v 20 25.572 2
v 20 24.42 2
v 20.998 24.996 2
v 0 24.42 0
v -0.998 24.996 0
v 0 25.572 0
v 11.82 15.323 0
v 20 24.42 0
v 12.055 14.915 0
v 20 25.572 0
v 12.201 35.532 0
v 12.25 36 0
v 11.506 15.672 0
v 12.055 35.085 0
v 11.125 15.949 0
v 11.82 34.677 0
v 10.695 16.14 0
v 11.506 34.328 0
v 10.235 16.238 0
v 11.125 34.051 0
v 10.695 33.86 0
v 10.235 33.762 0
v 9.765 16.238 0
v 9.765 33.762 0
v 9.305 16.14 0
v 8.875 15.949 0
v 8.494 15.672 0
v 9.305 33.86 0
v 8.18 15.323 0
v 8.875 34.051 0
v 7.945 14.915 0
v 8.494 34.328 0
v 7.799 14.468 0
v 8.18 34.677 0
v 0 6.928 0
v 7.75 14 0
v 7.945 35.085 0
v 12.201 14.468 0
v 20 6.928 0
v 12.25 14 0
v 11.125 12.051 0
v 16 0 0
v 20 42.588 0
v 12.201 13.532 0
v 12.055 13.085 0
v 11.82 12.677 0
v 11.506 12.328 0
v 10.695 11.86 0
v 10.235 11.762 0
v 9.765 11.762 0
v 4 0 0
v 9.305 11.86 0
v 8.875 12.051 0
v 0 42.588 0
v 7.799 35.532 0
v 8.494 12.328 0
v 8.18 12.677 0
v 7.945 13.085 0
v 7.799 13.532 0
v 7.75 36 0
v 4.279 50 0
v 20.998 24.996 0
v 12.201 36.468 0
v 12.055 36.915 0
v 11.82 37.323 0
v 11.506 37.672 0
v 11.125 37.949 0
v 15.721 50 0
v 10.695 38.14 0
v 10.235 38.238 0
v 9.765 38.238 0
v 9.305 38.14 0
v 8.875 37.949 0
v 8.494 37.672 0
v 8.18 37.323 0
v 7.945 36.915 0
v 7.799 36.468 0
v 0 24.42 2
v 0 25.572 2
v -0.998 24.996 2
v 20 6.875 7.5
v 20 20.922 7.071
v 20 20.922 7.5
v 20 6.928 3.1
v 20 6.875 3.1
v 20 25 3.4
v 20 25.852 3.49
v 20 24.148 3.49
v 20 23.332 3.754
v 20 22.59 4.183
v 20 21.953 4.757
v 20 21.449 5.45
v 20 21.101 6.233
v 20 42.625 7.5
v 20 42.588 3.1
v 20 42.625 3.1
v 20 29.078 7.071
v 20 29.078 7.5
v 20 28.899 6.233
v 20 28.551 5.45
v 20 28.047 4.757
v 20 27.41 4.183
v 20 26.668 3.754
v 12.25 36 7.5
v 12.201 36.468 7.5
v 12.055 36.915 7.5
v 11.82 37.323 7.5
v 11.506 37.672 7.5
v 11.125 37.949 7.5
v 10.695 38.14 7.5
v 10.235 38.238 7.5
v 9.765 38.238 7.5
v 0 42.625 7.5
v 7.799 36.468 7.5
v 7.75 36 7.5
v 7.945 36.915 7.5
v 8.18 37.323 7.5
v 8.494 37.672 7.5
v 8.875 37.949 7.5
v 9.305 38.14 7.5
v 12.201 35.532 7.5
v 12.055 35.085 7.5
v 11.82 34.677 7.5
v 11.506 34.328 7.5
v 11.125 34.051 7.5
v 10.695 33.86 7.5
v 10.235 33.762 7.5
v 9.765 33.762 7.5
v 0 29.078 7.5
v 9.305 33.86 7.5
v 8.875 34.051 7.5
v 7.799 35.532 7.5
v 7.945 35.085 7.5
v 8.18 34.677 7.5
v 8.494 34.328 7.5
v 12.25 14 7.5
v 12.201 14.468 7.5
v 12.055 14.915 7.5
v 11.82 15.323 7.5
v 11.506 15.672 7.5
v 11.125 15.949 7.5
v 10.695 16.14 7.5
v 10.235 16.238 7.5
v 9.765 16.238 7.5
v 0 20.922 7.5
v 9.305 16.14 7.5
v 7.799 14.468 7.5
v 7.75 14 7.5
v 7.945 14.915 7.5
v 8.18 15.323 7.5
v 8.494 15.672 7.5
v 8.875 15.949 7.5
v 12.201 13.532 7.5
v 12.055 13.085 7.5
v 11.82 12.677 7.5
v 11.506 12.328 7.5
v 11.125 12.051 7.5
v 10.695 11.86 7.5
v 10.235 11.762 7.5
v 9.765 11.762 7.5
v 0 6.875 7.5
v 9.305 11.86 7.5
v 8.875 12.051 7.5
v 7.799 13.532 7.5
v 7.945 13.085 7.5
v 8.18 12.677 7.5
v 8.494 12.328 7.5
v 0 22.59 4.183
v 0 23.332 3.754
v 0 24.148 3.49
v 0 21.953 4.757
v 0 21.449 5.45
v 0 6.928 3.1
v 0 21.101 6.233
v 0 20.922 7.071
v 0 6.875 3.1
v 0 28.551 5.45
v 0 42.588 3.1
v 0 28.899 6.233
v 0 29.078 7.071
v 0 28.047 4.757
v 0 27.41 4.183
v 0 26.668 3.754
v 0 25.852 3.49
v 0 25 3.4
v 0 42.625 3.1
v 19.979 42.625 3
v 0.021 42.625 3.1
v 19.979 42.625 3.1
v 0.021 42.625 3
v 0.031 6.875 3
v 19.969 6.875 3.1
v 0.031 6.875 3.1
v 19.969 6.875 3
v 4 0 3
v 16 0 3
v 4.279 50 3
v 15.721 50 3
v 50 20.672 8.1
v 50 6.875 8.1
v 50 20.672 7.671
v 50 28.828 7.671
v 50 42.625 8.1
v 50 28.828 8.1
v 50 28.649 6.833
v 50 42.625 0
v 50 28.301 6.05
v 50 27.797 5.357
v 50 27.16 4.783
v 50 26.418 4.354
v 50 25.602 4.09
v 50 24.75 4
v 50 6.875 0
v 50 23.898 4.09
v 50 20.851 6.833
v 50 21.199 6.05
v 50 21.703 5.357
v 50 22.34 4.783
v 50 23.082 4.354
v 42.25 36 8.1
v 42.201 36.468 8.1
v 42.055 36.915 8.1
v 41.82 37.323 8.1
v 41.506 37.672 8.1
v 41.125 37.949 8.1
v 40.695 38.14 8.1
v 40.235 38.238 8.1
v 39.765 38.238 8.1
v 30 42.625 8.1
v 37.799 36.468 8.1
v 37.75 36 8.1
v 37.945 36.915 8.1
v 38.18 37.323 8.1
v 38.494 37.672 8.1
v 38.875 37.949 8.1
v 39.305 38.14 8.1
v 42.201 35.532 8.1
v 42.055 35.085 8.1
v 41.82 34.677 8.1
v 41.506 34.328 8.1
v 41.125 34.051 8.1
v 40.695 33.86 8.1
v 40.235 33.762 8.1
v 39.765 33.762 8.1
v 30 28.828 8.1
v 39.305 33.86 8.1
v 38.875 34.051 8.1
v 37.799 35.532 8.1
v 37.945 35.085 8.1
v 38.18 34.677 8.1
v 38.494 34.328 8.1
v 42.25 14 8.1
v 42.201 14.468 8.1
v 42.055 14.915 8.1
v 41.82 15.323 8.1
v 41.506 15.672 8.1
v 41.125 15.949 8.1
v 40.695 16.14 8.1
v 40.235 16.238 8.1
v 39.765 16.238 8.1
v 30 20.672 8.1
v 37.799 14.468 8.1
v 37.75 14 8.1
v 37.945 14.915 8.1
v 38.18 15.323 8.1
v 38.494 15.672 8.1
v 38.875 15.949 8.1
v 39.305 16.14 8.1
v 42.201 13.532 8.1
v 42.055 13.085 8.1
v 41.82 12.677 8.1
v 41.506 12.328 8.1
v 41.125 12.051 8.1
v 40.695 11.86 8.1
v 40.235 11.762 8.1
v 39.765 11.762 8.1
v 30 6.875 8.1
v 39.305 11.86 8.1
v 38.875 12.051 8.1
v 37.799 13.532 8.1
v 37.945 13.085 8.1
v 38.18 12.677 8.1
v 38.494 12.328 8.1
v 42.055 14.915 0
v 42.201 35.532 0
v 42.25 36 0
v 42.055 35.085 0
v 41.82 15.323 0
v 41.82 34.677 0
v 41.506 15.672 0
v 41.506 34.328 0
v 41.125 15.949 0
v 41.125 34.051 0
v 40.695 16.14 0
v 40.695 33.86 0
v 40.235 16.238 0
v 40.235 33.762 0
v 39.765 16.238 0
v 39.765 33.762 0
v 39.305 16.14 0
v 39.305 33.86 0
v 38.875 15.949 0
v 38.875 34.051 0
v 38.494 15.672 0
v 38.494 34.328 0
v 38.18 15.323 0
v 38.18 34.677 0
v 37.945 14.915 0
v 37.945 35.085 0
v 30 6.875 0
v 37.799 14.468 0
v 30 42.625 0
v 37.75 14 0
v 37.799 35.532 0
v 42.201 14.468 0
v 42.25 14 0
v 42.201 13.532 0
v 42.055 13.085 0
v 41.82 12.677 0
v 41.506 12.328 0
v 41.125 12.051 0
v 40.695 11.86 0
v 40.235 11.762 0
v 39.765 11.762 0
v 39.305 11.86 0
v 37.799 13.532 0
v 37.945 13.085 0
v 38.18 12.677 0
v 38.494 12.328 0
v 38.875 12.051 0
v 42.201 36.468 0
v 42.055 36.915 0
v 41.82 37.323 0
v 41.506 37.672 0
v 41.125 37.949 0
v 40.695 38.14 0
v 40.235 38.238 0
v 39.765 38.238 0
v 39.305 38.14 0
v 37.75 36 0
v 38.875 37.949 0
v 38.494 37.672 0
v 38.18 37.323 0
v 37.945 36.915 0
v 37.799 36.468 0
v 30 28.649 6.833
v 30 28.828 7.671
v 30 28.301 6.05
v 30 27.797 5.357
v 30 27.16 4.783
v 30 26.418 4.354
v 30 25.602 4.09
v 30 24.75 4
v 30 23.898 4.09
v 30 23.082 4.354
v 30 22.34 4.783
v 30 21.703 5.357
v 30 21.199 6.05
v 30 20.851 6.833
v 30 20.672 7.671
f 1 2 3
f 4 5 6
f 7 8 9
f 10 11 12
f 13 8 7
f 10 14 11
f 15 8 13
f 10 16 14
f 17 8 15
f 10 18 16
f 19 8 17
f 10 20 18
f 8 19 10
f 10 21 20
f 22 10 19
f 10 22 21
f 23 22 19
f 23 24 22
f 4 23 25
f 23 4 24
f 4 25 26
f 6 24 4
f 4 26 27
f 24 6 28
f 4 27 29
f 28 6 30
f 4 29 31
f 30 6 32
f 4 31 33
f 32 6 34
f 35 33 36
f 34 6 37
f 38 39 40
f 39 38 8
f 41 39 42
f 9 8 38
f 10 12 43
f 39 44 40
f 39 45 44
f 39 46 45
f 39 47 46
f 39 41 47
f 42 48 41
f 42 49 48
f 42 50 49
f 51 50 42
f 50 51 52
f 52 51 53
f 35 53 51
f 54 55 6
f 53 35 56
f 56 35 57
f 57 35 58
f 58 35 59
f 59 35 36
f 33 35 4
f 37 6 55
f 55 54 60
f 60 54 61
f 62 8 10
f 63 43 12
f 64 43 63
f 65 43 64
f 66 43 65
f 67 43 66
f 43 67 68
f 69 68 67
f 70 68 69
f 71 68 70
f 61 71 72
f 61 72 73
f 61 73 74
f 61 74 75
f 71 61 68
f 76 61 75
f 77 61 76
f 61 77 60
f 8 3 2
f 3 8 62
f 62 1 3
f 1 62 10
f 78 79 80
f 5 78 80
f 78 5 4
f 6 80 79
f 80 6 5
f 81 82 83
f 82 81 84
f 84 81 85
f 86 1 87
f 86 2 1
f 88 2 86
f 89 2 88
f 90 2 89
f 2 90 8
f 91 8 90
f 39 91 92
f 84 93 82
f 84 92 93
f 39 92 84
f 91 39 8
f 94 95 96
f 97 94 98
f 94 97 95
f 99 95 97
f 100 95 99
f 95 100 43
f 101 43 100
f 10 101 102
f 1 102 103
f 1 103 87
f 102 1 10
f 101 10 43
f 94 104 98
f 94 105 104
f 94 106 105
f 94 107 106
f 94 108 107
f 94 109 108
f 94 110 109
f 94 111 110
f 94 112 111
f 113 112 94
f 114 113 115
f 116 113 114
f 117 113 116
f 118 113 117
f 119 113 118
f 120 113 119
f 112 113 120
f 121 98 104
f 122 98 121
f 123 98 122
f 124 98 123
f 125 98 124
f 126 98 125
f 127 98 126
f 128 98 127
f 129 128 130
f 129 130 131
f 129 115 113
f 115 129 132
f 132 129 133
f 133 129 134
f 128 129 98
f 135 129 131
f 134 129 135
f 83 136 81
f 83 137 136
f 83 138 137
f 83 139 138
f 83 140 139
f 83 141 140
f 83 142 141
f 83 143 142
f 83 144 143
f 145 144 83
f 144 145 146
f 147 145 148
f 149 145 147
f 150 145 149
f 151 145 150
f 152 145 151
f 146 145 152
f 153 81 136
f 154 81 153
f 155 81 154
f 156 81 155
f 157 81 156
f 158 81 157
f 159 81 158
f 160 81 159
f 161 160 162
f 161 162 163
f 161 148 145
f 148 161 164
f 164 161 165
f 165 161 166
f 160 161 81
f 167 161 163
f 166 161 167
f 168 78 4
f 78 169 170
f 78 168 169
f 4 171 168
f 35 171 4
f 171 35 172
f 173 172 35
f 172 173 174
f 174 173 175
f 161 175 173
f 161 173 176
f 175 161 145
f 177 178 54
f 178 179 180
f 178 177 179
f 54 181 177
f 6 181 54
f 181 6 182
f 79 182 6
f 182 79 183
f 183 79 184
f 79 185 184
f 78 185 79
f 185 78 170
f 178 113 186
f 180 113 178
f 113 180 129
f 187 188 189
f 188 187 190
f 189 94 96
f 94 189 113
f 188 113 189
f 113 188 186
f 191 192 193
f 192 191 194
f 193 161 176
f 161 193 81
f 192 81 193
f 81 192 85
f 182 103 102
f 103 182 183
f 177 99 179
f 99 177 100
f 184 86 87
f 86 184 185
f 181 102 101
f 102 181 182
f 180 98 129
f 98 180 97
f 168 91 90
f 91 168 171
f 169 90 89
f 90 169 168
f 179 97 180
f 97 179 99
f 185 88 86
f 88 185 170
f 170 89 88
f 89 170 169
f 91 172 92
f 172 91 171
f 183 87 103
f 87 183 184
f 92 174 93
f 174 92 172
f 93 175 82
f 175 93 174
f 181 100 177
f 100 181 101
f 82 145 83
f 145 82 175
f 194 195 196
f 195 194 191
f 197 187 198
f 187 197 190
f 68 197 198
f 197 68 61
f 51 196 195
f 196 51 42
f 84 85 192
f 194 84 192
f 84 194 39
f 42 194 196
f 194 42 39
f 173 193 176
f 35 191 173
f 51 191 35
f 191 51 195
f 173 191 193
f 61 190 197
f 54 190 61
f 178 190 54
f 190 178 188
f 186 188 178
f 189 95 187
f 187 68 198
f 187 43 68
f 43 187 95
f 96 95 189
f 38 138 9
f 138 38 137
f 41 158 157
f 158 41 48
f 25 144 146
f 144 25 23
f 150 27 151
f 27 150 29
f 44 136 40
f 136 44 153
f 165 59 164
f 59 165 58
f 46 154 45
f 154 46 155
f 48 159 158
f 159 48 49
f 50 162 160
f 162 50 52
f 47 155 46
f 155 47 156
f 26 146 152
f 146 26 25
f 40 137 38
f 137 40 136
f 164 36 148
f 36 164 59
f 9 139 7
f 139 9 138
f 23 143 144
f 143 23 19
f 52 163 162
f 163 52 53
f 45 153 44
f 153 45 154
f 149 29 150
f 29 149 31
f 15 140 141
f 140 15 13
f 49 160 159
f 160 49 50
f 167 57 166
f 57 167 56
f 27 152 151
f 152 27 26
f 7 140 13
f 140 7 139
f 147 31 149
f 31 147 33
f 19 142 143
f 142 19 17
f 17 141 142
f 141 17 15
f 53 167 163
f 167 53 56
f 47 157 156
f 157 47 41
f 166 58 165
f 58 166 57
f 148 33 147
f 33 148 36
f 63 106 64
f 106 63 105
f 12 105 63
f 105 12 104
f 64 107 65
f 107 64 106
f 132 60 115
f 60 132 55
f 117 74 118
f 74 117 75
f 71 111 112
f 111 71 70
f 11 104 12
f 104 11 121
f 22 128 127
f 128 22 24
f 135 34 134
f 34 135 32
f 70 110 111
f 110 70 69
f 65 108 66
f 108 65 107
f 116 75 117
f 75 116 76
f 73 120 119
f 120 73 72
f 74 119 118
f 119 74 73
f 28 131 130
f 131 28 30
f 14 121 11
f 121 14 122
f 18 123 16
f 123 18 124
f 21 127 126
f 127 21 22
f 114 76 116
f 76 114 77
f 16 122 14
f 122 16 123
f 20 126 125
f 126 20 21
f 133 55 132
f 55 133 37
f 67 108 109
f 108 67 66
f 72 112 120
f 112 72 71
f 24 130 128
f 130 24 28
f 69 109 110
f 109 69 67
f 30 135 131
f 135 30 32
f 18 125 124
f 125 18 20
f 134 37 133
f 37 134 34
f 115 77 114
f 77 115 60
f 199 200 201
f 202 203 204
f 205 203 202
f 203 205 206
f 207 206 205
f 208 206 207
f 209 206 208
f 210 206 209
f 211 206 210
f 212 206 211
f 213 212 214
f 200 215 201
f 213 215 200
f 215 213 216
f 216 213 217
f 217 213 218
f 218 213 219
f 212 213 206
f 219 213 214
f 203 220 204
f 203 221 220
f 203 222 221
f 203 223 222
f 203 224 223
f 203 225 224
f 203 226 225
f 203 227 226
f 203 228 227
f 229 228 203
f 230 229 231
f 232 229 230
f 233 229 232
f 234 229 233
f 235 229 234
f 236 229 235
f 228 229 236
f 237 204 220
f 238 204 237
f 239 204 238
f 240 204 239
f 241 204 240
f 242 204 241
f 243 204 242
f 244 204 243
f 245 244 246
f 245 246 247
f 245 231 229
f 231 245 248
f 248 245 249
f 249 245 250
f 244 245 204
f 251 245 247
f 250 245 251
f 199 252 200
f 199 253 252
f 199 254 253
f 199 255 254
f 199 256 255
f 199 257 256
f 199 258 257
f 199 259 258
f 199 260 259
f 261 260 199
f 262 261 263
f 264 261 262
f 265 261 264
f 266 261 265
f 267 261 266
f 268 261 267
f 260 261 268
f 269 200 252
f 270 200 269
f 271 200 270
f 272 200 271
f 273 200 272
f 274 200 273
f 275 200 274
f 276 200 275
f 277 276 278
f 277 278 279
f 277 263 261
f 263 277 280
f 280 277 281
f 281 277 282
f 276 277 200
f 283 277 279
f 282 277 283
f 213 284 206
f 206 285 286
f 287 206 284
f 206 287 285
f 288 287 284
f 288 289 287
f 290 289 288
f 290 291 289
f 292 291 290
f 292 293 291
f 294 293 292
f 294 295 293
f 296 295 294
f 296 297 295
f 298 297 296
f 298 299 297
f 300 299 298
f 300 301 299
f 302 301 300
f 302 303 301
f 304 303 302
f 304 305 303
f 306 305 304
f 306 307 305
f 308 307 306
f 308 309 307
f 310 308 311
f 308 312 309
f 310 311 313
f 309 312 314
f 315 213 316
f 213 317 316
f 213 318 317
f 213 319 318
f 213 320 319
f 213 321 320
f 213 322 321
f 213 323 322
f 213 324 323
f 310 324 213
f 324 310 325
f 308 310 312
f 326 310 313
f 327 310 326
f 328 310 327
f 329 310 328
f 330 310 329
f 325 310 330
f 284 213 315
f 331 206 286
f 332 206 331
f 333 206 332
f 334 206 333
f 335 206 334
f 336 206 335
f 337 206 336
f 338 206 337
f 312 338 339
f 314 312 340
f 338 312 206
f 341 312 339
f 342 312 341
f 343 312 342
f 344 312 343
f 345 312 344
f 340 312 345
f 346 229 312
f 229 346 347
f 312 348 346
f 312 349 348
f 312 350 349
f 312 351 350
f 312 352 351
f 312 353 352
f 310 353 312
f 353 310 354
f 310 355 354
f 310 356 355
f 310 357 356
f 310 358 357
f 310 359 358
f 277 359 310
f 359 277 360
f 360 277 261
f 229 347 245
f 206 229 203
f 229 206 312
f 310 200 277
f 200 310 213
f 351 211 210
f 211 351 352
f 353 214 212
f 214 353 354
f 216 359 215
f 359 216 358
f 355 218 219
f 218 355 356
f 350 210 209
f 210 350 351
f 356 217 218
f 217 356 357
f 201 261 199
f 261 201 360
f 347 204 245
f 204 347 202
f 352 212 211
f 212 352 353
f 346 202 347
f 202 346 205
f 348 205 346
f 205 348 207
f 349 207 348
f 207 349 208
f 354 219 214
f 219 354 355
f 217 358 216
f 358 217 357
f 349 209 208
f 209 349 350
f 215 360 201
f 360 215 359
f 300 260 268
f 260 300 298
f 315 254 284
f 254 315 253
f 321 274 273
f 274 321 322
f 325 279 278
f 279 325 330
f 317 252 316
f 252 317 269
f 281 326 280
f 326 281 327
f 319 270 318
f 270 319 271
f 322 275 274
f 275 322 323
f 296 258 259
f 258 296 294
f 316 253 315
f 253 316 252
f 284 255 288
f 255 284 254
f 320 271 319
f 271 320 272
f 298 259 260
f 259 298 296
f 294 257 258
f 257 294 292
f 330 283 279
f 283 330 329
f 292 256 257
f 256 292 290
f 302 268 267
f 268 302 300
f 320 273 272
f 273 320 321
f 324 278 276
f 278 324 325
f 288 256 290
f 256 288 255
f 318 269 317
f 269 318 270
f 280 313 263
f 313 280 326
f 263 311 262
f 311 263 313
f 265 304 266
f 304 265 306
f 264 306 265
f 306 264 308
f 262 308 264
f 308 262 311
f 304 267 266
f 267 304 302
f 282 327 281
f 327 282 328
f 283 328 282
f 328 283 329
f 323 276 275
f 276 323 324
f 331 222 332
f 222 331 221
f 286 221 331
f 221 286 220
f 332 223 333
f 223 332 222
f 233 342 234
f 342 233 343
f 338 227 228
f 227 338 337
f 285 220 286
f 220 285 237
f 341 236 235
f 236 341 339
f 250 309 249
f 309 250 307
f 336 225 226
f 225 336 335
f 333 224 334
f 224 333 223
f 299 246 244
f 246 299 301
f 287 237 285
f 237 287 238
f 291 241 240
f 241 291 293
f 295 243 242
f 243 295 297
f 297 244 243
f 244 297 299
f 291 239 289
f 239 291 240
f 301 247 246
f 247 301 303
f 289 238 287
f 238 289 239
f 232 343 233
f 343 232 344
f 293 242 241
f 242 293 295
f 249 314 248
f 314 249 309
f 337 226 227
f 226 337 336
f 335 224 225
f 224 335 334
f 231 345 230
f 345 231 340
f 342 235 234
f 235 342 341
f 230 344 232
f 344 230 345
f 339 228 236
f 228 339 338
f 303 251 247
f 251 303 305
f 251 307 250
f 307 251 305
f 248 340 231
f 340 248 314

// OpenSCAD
// file: functions.scad
// PRUSA Mendel  
// Functions used in many files
// GNU GPL v2
// Josef Průša
// josefprusa@me.com
// prusadjs.cz
// http://www.reprap.org/wiki/Prusa_Mendel
// http://github.com/prusajr/PrusaMendel

module nut(d,h,horizontal=true){
cornerdiameter =  (d / 2) / cos (180 / 6);
cylinder(h = h, r = cornerdiameter, $fn = 6);
if(horizontal){
for(i = [1:6]){
	rotate([0,0,60*i]) translate([-cornerdiameter-0.2,0,0]) rotate([0,0,-45]) cube(size = [2,2,h]);
}}
}

// By nophead
module polyhole(d,h) {
    n = max(round(2 * d),3);
    rotate([0,0,180])
        cylinder(h = h, r = (d / 2) / cos (180 / n), $fn = n);
}




module roundcorner(diameter){
	difference(){
		cube(size = [diameter,diameter,99], center = false);
		translate(v = [diameter, diameter, 0]) cylinder(h = 100, r=diameter, center=true);
	}
}
// file: metric.scad
// PRUSA Mendel  
// Default metric sizes
// GNU GPL v2
// Josef Průša
// josefprusa@me.com
// prusadjs.cz
// http://www.reprap.org/wiki/Prusa_Mendel
// http://github.com/prusajr/PrusaMendel

// DONT CHANGE THIS FILE! ALTER VALUES IN CONFIGURATION.SCAD INSTEAD

// RODS

threaded_rod_diameter = 8.2;
threaded_rod_diameter_horizontal = 8.2;
smooth_bar_diameter = 8;
smooth_bar_diameter_horizontal = 8.5;

// Nuts and bolts

m8_diameter = 9;
m8_nut_diameter = 16.4;

m4_diameter = 4.5;
m4_nut_diameter = 9;

m3_diameter = 3.6;
m3_nut_diameter = 6.1;

// Bushing holder

bushing_core_diameter = smooth_bar_diameter;
bushing_material_thickness = 1;

// Motors

motor_shaft = 5.5;
// file: configuration.scad
// PRUSA Mendel  
// Configuration file
// GNU GPL v2
// Josef Průša
// josefprusa@me.com
// prusadjs.cz
// http://www.reprap.org/wiki/Prusa_Mendel
// http://github.com/prusajr/PrusaMendel

// PLEASE SELECT ONE OF THE CONFIGURATIONS BELOW
// BY UN-COMMENTING IT

// Uncomment for metric settings
// METRIC METRIC METRIC METRIC METRIC METRIC METRIC METRIC 

include <metric.scad>;

// Uncomment for imperial settings
// IMPERIAL IMPERIAL IMPERIAL IMPERIAL IMPERIAL IMPERIAL IMPERIAL 

//include <sae.scad>;

// CUSTOM CUSTOM CUSTOM CUSTOM CUSTOM CUSTOM CUSTOM CUSTOM CUSTOM

thin_wall = 3;

// LM8UU
linear = false;


// CHANGE ONLY THE STUFF YOU KNOW
// IT WILL REPLACE DEFAULT SETTING

// RODS

// threaded_rod_diameter = 0;
// threaded_rod_diameter_horizontal = 0;
// smooth_bar_díameter = 0;
// smooth_bar_díameter_horizontal = 0;

// Nuts and bolts

// m8_diameter = 0;
// m8_nut_diameter = 0;

// m4_diameter = 0;
// m4_nut_diameter = 0;

// m3_diameter = 0;
// m3_nut_diameter = 0;

// Bushing holder

// bushing_core_diameter = smooth_bar_díameter;
// bushing_material_thickness = 0;


///counted stuff
m3_nut_diameter_bigger = ((m3_nut_diameter  / 2) / cos (180 / 6))*2;

// functions 
include <functions.scad>
// main file
// C. Strang		
// cstrang@????
// funfor.us

include <configuration.scad>;

h = 3;       	// base thickness
m = h-1;			// marker height
o = 0.1;			//  overlap amount
hh = 14;			// bar holder height
an=m4_diameter ; 


m3=m3_diameter;
m3n=m3_nut_diameter;
bar=smooth_bar_diameter_horizontal;

$fn=30;

yzrodholder(h, m, hh, an);
rodholder_clamp(h, an, hh);

module yzrodholder(yzh,yzm,yzhh,yzn)
{
	difference()
	{
		union()
		{
			translate([0,0,0]) rotate([0,0,0]) cube([20,50,yzh]);
			translate([20-o, 24.4, 0]) marker(yzm);
			translate([o, 24.4, 0]) mirror() marker(yzm);
			translate([0, 16.5, h-o]) rodholder(yzhh);
		}
		translate([16,0,-o]) rotate([0,0,-30]) cube([10,10,yzh+2*o]);
		translate([4,0,-o]) mirror() rotate([0,0,-30]) cube([10,10,yzh+2*o]);
		translate([-9,47,-o]) rotate([0,0,-30]) cube([10,10,yzh+2*o]);
		translate([29,47,-o]) mirror() rotate([0,0,-30]) cube([10,10,yzh+2*o]);
		translate([10,10 + 4,-o]) cylinder(r=yzn/2,h=yzh+5);
		translate([10,40 - 4,-o]) cylinder(r=yzn/2,h=yzh+5);
	}

}

module marker(mm)
{
	difference()
	{
		cube([1.1,1.2,mm]);
		translate([1,-1.77,-o]) rotate([0,0,30]) cube([2,2,mm+2*o]);
		translate([0,1.23,-o]) rotate([0,0,-30]) cube([2,2,mm+2*o]);
	}
}

module rodholder(rhh)
{
	difference()
	{
		union()
		{
			translate([0, -9.625, 0]) rotate([0,0,0]) cube([20, 35.75, 8 / 2 + 0.5 + o]);
//			translate([10,8.5,0]) cylinder(r=(bar),h=rhh+o,$fn=50);
		}
//		translate([2.5,8.5,10.4]) rotate([90,90,90]) cylinder(r=m3n/2,h=5,$fn=6);
//		translate([-0.1,8.5,10.4]) rotate([90,90,90]) cylinder(r=m3/2,h=9);
//		translate([2.5,5.85,10.4]) rotate([0,0,0]) cube([5,m3n-0.8,m3n]);

		translate([-0.01, 8.5, 8 / 2 + 0.5 + 0.1]) rotate([0, 90, 0]) cylinder(r = 8 / 2 + o, h = 20 + 1);
	}
}

module rodholder_clamp(yzh, yzn, rhh) {
	difference() {
		translate([30, 6.875, 0]) rotate([0,0,0]) cube([20, 35.75, 3.5 + 4 + 0.5 + o]);	// 6.875 = -9.625 + 16.5
		translate([30 - o, 6.875 + 35.75 / 2, 3.5 + 8 / 2 + 0.5 + 0.1]) rotate([0, 90, 0]) cylinder(r = 8 / 2 + o, h = 20 + 1);
		translate([30 + 10,10 + 4,-o]) cylinder(r=yzn/2,h=yzh + 8);
		translate([30 + 10,40 - 4,-o]) cylinder(r=yzn/2,h=yzh + 8);
	}
}
